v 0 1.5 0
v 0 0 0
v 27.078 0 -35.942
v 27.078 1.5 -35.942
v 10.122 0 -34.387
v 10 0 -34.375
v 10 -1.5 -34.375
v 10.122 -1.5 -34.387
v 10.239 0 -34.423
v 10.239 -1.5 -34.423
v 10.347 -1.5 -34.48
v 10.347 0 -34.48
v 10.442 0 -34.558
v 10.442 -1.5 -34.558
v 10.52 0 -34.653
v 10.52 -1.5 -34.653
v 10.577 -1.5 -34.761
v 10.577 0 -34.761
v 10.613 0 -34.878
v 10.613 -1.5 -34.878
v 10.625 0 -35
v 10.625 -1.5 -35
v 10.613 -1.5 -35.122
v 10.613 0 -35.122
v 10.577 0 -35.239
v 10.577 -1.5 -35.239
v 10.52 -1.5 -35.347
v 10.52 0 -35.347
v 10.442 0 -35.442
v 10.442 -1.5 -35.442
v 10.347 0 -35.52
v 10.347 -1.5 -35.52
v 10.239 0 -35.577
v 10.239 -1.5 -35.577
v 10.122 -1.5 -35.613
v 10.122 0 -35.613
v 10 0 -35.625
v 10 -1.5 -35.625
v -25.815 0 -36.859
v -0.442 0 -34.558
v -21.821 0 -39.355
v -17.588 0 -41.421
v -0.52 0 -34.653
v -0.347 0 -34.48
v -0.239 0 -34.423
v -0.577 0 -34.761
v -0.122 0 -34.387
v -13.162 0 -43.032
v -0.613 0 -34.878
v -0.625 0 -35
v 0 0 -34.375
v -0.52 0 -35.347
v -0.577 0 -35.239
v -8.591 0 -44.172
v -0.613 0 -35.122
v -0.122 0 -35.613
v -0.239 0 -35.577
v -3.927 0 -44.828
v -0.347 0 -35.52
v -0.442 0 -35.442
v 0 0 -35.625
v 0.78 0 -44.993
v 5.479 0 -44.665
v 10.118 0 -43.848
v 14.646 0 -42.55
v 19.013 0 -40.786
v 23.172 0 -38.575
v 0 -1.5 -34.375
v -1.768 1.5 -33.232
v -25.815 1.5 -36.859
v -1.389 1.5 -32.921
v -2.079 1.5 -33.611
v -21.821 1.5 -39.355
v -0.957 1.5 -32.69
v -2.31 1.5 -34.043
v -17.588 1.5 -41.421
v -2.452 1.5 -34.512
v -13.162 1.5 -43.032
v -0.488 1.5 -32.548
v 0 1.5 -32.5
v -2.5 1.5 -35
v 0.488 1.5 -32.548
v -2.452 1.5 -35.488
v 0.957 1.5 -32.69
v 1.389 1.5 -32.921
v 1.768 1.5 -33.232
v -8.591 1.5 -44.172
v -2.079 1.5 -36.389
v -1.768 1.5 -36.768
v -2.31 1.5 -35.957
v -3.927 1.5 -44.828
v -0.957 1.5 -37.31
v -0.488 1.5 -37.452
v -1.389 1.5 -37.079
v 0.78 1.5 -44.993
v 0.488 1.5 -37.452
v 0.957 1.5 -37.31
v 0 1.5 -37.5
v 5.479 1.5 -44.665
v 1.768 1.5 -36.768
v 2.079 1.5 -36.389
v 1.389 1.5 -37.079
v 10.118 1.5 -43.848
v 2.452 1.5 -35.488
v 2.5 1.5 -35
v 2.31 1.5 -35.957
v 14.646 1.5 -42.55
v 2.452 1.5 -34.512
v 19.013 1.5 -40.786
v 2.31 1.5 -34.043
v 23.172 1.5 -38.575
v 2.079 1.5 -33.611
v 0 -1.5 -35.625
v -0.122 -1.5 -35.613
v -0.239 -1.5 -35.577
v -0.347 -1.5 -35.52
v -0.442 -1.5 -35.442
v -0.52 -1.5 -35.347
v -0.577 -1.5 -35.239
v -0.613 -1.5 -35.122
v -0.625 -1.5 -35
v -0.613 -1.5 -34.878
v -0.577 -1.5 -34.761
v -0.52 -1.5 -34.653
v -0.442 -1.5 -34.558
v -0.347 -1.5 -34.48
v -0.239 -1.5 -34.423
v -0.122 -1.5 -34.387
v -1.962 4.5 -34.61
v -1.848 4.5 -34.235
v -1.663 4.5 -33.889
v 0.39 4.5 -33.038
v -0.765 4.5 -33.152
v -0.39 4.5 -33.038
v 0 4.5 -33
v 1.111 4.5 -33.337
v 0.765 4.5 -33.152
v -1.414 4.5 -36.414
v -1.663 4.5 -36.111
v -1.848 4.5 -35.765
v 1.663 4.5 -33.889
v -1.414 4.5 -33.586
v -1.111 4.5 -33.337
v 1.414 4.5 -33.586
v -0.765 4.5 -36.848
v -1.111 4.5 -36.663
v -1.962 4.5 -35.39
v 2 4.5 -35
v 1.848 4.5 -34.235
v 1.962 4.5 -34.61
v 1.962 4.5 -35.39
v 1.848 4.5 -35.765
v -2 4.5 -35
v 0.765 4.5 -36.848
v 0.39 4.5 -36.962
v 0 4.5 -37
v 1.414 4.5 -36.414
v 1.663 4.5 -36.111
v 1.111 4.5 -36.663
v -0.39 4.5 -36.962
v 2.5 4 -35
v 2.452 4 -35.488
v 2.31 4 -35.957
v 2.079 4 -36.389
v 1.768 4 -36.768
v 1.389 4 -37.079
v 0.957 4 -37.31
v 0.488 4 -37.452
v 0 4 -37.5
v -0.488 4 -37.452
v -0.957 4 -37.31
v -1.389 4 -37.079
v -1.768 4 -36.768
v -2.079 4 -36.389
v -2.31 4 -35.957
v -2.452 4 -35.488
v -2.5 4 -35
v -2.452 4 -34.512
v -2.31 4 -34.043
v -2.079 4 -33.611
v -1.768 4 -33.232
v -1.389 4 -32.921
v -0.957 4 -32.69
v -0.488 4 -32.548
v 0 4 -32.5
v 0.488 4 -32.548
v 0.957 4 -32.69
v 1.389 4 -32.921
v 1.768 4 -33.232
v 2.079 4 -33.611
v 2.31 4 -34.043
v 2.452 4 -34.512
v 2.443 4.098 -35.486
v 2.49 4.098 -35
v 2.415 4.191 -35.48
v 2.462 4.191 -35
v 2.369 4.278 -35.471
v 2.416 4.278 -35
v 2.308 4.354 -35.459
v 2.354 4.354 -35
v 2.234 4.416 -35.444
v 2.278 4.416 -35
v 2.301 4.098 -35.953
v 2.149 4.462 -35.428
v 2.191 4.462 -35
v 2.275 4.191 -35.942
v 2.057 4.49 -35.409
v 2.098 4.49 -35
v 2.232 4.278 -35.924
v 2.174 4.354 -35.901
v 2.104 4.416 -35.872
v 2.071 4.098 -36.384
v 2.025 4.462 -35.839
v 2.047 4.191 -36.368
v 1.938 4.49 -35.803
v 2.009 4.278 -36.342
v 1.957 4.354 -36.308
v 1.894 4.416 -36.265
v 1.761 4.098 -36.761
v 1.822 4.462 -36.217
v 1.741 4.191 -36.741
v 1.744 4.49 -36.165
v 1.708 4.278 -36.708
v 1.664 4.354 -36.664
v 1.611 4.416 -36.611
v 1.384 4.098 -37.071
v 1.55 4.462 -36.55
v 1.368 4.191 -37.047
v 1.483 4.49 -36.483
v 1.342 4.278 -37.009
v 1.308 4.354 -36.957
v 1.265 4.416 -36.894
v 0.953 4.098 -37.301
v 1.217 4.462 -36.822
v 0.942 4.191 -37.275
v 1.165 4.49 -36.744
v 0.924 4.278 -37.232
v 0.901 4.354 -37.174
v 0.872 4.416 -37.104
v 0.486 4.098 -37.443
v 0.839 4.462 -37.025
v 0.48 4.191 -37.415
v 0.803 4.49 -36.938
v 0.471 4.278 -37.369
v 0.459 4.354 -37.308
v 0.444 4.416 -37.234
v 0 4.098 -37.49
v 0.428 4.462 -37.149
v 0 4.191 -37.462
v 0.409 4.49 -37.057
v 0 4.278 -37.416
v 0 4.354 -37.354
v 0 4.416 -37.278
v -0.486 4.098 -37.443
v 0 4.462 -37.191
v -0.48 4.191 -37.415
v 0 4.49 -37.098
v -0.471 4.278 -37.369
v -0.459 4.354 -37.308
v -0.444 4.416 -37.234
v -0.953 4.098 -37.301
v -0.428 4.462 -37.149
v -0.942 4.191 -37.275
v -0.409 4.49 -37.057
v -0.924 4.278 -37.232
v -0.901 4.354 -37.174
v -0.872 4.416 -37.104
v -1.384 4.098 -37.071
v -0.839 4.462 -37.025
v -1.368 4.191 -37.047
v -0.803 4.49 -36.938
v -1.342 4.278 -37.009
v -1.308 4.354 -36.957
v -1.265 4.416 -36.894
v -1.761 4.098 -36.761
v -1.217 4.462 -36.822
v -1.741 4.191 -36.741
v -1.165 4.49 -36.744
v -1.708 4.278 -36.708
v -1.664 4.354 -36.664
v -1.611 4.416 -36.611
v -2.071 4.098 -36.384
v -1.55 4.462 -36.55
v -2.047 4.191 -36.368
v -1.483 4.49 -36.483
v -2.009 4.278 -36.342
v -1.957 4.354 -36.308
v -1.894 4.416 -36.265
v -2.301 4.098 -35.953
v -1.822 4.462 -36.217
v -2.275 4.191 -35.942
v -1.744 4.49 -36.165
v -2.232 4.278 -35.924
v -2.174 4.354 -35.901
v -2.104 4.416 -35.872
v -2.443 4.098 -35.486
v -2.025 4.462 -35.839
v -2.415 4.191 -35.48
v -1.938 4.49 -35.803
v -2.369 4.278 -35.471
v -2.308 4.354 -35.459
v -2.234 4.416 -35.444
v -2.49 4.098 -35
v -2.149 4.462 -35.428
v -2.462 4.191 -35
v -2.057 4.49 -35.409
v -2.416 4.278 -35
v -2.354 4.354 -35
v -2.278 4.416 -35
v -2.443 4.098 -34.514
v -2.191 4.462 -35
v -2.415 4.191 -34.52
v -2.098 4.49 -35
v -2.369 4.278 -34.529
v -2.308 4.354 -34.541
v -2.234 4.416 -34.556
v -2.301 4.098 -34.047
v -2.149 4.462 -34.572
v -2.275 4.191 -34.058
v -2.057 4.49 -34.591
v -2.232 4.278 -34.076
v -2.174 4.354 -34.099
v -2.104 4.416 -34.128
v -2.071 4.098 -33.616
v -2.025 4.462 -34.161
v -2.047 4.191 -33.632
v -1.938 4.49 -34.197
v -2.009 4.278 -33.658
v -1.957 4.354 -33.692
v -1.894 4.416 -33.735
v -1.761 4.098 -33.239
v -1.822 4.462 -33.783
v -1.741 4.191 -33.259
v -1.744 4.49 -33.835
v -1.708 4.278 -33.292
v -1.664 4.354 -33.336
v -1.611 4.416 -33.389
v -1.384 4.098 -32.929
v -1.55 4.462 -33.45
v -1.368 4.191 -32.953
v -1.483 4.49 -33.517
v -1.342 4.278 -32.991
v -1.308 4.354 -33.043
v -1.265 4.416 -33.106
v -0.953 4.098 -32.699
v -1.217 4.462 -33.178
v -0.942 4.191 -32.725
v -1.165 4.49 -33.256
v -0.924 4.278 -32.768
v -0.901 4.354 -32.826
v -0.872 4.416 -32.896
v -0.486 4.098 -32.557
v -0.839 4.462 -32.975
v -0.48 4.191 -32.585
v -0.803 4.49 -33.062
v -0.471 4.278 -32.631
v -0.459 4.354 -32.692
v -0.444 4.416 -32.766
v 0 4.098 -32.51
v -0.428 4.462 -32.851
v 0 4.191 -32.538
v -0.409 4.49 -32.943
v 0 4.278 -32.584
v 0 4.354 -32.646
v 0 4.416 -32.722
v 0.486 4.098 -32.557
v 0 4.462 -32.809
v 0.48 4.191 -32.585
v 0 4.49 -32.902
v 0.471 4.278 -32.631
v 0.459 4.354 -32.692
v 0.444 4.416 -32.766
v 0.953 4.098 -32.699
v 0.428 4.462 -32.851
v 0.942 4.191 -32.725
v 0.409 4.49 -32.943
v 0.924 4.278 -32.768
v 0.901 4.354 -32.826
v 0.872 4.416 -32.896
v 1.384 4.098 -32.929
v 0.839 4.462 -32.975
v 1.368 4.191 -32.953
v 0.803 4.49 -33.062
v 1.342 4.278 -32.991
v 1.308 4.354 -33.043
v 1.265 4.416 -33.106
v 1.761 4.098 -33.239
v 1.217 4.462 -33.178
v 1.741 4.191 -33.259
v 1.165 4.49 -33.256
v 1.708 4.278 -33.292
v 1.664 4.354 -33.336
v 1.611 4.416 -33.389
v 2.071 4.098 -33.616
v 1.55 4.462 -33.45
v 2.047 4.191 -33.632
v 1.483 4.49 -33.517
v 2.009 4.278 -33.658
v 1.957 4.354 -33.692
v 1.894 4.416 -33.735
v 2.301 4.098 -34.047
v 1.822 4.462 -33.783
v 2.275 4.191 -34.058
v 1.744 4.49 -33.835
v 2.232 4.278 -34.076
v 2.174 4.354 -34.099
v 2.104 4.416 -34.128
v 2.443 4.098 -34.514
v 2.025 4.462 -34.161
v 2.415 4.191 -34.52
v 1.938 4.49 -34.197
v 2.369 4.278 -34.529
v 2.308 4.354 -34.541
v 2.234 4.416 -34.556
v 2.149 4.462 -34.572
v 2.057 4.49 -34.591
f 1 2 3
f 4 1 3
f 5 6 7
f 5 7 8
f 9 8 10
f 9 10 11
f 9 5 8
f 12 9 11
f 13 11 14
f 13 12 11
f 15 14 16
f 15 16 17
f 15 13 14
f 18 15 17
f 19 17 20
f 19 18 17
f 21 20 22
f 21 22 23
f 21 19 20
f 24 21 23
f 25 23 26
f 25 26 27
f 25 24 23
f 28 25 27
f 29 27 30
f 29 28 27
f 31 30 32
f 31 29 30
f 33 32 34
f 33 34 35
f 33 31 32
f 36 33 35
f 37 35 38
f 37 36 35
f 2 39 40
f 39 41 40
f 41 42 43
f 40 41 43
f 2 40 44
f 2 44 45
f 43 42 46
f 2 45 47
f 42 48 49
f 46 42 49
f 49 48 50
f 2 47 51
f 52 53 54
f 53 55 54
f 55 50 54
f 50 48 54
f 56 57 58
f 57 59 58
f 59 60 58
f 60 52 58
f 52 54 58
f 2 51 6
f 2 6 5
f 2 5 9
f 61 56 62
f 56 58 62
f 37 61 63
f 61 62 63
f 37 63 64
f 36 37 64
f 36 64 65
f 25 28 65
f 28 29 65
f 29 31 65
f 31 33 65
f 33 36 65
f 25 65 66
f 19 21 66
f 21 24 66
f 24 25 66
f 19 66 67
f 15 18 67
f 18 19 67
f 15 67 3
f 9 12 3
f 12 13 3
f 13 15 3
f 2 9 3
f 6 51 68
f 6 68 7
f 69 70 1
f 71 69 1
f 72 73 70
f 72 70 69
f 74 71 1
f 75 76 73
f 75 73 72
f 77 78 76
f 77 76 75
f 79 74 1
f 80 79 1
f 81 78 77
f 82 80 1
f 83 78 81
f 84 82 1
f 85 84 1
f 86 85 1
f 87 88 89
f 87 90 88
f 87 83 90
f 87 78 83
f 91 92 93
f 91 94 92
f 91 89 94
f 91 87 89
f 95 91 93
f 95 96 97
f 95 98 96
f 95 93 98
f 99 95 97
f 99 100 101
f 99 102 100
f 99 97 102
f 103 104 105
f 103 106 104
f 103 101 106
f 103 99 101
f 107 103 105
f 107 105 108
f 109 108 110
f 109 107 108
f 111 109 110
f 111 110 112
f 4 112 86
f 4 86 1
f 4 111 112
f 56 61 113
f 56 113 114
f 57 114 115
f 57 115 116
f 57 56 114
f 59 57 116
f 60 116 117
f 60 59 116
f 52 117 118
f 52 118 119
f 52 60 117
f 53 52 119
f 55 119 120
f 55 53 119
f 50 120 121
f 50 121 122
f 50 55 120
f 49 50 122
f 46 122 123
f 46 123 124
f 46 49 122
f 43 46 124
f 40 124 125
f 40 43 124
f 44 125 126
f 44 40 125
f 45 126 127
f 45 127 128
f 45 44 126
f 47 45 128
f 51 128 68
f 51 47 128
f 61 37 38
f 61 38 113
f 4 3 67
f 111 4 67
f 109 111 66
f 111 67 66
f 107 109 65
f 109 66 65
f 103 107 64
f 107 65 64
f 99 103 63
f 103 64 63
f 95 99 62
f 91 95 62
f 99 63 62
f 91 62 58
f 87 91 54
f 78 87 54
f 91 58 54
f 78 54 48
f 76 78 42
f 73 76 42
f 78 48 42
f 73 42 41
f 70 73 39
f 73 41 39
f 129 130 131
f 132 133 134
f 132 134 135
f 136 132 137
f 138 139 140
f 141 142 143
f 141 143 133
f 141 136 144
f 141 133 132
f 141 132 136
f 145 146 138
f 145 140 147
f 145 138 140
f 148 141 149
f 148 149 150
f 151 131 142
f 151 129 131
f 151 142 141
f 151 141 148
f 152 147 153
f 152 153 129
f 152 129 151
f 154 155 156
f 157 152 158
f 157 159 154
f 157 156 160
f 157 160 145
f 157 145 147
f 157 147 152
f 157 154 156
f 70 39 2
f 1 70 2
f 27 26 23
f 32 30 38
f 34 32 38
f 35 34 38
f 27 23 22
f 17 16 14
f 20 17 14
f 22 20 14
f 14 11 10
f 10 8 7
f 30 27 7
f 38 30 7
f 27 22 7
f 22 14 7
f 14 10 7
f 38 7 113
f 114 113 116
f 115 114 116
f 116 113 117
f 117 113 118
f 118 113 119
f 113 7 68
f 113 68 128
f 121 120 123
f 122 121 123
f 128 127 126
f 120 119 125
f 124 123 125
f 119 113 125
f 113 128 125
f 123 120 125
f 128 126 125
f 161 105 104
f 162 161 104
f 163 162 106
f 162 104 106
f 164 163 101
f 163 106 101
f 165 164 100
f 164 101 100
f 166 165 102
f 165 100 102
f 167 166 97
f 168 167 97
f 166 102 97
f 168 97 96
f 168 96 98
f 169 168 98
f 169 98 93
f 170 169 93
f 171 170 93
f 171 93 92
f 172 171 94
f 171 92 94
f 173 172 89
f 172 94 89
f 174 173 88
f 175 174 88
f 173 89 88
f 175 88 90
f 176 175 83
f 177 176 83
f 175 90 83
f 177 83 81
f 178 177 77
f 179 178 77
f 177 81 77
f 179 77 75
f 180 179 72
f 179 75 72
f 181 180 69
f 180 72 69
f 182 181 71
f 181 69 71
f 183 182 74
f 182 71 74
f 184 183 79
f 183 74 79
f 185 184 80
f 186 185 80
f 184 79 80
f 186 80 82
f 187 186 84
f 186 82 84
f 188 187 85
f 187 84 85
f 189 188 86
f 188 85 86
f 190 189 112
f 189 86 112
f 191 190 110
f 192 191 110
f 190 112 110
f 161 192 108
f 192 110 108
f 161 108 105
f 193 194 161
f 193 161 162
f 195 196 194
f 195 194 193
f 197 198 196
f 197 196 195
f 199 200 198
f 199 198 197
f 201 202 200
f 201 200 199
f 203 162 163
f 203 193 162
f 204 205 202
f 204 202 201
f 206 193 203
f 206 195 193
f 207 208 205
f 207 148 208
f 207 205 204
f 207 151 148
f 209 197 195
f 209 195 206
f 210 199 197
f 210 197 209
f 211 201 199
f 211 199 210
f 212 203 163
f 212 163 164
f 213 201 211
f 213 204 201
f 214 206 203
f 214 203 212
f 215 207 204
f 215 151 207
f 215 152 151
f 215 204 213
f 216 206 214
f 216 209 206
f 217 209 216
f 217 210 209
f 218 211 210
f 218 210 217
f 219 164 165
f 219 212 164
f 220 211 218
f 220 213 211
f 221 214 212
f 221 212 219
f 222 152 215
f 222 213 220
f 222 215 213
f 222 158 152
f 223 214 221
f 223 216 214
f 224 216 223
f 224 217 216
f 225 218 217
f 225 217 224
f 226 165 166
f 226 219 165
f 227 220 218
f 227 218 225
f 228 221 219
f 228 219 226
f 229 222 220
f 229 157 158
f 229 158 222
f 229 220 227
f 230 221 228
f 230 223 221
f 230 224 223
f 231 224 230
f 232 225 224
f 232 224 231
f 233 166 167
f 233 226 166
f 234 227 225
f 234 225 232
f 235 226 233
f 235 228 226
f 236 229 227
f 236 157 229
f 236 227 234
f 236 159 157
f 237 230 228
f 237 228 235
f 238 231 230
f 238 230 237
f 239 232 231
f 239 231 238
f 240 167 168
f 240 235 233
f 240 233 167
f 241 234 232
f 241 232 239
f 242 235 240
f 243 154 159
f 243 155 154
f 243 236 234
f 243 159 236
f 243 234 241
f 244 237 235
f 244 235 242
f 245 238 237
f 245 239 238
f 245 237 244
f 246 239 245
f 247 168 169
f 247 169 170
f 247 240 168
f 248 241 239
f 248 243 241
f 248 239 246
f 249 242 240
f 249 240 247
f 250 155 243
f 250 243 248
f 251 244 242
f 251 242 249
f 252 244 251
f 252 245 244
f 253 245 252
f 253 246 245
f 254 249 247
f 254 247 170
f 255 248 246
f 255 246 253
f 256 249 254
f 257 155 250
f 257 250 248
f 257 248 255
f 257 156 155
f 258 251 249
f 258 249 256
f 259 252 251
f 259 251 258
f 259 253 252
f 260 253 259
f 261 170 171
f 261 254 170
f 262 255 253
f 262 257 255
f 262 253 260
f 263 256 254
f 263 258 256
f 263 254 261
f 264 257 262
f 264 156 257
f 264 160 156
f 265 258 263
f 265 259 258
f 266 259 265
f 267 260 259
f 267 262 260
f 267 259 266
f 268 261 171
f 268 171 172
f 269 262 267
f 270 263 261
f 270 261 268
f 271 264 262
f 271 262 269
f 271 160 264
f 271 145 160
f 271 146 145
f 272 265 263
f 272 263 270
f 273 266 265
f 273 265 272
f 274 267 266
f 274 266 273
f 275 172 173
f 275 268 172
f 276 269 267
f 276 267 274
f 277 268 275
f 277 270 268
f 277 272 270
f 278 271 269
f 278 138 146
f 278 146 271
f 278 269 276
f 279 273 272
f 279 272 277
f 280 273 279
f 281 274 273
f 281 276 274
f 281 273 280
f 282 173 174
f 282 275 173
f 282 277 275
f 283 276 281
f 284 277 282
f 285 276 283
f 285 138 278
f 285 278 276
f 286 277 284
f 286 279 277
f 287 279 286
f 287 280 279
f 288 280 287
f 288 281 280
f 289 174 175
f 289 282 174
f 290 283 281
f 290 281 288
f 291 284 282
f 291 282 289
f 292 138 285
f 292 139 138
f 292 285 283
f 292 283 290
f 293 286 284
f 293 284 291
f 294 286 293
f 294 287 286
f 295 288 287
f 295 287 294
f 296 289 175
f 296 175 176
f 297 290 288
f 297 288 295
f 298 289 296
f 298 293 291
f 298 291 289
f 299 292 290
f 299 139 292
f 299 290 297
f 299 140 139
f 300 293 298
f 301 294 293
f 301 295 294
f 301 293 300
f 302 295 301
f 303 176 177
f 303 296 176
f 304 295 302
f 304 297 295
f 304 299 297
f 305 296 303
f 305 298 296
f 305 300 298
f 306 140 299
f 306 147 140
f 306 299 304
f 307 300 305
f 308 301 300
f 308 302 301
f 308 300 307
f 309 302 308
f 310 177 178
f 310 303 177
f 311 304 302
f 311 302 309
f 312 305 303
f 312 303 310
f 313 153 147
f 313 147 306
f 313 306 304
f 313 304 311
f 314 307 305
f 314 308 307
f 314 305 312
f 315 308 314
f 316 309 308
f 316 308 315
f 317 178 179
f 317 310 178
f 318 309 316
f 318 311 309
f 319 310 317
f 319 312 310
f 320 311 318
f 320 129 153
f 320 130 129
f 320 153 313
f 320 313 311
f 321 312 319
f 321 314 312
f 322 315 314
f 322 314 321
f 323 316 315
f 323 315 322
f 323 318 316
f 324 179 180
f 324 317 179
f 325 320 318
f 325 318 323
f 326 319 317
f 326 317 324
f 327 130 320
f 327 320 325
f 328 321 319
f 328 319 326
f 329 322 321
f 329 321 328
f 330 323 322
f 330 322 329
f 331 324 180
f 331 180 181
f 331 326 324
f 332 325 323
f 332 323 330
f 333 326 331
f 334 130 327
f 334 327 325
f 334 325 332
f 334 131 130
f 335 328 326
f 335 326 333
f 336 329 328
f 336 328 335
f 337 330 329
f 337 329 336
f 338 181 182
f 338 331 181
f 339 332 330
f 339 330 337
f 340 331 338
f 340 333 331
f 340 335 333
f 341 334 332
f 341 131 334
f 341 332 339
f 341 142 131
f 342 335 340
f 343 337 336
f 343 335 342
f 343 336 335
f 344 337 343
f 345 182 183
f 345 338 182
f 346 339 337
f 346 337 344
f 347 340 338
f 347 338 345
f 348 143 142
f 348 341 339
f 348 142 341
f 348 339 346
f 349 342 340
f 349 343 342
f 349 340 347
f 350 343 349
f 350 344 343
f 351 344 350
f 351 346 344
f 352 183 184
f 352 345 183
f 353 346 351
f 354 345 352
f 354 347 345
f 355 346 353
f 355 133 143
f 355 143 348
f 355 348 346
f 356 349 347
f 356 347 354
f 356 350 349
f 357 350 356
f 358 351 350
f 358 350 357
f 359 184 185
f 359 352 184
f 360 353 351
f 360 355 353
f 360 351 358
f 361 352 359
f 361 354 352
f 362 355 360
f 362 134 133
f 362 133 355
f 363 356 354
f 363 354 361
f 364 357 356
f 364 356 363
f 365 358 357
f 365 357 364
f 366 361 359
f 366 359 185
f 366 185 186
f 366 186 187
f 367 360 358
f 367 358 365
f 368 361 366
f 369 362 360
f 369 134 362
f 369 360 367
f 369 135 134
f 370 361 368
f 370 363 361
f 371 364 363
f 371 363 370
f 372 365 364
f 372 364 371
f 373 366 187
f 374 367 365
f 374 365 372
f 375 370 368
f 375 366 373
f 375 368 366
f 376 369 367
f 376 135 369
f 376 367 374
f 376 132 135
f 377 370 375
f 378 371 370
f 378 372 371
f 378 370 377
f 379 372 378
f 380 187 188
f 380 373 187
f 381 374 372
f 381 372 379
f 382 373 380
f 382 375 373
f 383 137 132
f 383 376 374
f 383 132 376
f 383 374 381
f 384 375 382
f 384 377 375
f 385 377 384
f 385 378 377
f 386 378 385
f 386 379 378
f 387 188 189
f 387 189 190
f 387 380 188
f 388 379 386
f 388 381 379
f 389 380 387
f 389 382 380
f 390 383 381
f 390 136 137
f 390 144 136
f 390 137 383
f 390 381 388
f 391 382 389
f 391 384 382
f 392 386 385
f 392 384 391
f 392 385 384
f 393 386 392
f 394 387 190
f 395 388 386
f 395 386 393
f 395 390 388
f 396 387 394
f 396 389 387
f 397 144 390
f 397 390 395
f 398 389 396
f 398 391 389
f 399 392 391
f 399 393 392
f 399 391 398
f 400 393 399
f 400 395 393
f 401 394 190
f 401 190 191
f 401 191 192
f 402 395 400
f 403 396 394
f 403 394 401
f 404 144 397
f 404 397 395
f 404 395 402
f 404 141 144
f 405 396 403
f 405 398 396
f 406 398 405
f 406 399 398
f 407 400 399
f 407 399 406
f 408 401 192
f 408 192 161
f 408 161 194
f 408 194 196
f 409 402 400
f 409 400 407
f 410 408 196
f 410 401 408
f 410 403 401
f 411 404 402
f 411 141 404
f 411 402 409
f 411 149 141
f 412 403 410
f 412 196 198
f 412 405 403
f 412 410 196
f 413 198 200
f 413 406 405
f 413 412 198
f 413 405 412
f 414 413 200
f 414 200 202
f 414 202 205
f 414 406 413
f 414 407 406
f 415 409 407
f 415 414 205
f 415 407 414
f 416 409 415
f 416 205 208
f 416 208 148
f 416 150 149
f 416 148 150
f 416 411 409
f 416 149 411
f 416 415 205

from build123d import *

# Parameters (mm, degrees)
BOSS_EXTRUDE1_DEPTH = 1.5
BOSS_EXTRUDE2_DEPTH = 1.5
SKETCH4_R           = 2.5
BOSS_EXTRUDE3_DEPTH = 3
FILLET1_R           = 0.5


with BuildPart() as part:
    # Sketch2 → Boss-Extrude1 (new body)
    with BuildSketch(Plane(origin=(0, 0, 0), x_dir=(1, 0, 0), z_dir=(0, 1, 0))):
        with BuildLine():
            Line((-25.815069681, 36.858949759), (0, 0))
            Line((0, 0), (27.07764911, 35.94163211))
            ThreePointArc((27.07764911, 35.94163211), (0.780317, 44.993233996), (-25.815069681, 36.858949759))
        make_face()
    extrude(amount=BOSS_EXTRUDE1_DEPTH)

    # Sketch3 → Boss-Extrude2 (add)
    with BuildSketch(Plane.XZ):
        with BuildLine():
            Line((0, -34.375), (10, -34.375))
            ThreePointArc((10, -34.375), (10.625, -35), (10, -35.625))
            Line((10, -35.625), (0, -35.625))
            ThreePointArc((0, -35.625), (-0.625, -35), (0, -34.375))
        make_face()
    extrude(amount=BOSS_EXTRUDE2_DEPTH)

    # Sketch4 → Boss-Extrude3 (add)
    with BuildSketch(Plane(origin=(0, 1.5, 0), x_dir=(1, 0, 0), z_dir=(0, 1, 0))):
        with Locations((0, 35)):
            Circle(SKETCH4_R)
    extrude(amount=BOSS_EXTRUDE3_DEPTH)

    # Fillet1
    fillet1_edges = [part.edges().sort_by_distance(p)[0] for p in [
        (-2.5, 4.5, -35),
    ]]
    fillet(fillet1_edges, radius=FILLET1_R)


solid = part.part
